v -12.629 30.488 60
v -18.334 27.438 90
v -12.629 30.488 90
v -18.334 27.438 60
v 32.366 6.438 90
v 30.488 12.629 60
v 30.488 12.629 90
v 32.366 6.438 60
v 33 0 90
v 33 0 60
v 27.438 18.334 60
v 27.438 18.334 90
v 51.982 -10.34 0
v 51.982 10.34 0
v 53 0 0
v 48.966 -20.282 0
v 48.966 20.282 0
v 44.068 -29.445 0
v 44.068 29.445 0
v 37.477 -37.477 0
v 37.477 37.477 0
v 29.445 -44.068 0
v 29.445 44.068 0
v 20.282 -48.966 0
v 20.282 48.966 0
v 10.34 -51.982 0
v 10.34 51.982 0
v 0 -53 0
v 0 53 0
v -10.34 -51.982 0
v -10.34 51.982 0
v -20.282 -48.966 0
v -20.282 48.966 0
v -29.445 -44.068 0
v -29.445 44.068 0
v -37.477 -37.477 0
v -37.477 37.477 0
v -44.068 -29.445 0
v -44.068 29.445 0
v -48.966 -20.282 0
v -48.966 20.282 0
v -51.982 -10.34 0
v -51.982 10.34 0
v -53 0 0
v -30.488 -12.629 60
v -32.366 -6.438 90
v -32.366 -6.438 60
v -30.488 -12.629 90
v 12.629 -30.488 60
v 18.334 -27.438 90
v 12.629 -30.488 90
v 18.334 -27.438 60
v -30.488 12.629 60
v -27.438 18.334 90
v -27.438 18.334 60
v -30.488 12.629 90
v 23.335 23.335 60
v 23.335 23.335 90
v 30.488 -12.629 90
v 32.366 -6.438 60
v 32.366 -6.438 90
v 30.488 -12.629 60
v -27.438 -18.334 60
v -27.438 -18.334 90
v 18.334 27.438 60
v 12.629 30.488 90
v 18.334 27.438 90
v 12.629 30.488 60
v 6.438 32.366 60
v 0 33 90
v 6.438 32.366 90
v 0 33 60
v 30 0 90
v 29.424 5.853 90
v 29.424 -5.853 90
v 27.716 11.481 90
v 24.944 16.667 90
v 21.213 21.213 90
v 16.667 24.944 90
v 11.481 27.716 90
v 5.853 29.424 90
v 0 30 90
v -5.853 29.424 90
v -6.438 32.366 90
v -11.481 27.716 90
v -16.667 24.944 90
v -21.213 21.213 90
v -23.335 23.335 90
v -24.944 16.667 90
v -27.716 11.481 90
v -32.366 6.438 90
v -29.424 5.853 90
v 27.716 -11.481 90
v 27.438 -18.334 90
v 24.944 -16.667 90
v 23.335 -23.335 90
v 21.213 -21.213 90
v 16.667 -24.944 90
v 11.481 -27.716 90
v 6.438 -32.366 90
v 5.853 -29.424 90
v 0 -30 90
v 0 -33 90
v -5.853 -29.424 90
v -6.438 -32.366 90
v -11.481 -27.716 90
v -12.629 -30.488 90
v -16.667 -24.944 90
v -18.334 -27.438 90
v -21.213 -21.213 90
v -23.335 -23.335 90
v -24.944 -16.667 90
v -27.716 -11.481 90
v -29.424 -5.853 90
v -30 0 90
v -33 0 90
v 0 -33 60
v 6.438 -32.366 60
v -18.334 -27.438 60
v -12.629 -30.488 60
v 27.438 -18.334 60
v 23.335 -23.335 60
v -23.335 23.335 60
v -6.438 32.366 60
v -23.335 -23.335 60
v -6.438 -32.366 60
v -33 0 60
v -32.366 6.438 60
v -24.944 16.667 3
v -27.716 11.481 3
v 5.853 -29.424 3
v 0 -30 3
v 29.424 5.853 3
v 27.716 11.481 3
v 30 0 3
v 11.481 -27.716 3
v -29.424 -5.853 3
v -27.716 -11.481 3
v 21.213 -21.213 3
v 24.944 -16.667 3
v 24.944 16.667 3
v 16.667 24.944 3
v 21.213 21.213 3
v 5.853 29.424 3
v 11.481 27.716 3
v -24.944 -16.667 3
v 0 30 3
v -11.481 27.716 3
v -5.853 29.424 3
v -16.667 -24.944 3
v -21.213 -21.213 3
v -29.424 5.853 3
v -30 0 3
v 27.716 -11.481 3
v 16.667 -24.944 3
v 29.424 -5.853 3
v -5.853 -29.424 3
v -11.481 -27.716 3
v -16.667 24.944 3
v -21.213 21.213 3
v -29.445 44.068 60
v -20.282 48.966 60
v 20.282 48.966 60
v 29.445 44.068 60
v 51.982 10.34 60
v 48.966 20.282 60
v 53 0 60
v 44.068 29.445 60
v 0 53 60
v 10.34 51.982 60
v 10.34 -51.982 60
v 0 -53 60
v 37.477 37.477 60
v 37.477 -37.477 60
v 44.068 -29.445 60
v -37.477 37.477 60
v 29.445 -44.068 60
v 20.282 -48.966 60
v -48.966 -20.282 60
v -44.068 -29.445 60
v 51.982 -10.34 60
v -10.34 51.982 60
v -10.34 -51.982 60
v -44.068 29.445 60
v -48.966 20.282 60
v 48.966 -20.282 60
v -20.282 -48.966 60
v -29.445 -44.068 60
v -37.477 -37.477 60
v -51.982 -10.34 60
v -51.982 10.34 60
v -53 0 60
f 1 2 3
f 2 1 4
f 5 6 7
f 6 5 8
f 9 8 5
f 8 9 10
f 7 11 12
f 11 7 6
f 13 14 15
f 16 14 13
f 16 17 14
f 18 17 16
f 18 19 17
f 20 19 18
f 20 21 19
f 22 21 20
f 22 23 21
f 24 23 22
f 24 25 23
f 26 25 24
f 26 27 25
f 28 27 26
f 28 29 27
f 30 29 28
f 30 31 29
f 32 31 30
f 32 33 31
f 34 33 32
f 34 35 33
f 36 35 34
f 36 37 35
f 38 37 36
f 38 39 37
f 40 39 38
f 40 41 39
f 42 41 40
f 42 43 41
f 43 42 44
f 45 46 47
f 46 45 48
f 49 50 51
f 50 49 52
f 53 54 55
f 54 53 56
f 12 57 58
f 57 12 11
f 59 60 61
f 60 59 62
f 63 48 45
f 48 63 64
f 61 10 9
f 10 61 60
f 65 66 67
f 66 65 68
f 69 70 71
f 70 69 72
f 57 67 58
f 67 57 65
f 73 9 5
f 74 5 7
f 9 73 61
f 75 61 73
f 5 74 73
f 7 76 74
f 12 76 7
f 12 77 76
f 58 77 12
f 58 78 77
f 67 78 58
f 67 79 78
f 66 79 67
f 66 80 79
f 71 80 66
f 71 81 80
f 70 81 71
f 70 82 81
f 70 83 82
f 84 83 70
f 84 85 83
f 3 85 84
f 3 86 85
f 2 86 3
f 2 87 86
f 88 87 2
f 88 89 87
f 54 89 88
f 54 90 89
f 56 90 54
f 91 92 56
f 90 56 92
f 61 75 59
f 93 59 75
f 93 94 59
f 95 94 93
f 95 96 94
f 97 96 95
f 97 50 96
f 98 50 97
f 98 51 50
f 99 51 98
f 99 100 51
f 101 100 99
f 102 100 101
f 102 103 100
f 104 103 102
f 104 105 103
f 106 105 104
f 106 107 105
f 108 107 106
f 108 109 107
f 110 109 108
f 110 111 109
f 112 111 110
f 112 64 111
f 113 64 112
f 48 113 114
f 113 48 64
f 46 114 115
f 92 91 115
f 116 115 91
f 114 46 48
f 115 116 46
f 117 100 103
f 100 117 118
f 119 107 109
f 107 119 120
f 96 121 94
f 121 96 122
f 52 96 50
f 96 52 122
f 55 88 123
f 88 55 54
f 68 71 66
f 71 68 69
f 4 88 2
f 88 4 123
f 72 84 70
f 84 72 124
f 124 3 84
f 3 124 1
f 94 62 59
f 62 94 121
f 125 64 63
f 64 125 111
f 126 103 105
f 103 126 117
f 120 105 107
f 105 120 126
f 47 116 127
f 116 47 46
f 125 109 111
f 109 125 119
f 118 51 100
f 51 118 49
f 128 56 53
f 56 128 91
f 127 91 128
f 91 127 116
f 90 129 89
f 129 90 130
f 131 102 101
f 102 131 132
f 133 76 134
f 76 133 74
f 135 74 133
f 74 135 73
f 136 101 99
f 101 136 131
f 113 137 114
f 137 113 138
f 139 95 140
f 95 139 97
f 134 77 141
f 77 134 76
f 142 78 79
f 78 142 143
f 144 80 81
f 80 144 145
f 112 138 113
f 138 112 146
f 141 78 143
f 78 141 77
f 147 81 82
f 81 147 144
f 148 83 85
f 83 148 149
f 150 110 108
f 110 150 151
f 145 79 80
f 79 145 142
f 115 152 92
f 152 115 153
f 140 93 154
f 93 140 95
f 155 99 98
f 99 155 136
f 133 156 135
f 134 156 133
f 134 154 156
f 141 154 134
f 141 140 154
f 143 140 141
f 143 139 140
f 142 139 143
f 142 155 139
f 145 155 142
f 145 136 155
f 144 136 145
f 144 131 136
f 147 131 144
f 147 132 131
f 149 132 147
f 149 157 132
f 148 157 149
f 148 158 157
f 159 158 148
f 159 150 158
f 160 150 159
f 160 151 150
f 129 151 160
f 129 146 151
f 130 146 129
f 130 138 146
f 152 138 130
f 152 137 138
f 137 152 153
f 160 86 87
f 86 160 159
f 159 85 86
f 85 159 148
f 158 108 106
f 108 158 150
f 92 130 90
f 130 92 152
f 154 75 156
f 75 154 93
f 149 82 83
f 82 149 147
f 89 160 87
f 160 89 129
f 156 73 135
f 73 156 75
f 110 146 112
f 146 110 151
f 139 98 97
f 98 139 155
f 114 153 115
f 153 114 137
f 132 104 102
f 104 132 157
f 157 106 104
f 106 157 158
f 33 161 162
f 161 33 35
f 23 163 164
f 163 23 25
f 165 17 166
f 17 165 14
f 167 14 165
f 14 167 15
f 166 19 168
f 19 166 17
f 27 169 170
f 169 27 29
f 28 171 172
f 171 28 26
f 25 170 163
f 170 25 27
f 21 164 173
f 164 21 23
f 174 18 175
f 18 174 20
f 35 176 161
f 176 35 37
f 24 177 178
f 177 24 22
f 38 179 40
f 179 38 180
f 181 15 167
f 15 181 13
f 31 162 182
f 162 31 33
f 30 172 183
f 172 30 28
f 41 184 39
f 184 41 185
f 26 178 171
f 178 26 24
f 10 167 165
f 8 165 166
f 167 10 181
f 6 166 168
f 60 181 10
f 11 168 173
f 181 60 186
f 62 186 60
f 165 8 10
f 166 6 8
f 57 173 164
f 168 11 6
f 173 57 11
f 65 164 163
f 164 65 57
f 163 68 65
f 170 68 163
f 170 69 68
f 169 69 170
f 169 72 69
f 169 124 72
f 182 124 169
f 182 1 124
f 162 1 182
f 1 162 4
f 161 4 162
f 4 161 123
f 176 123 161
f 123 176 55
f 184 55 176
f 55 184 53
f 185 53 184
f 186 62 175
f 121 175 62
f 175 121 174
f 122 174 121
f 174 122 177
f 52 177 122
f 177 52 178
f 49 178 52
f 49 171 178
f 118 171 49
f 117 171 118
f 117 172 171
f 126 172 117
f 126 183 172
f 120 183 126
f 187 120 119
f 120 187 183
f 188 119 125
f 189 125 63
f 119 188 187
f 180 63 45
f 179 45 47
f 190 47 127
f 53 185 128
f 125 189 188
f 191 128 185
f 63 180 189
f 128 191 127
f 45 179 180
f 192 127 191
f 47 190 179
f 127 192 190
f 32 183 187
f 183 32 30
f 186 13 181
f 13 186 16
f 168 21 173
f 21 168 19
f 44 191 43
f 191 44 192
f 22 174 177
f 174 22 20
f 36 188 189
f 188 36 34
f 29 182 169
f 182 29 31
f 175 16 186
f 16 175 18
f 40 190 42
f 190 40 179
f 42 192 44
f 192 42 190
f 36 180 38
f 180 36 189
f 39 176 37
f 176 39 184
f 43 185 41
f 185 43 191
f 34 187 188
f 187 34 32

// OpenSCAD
// Stiftköcher: Innenbecher + oben offener Außenring
// mit radialen Kompartimenten innen und außen
// Version 2.5

// --- Parameter ---
inner_diameter         = 60;   // Innendurchmesser des Hauptfachs (mm)
inner_height           = 90;   // Höhe des Innenbechers (mm)

outer_ring_width       = 20;   // Breite des äußeren Rings (mm)
outer_height           = 60;   // Höhe des äußeren Rings/Fächer (mm)

wall_thickness         = 3;    // Wandstärke (innen und außen)
bottom_thickness       = 3;    // Bodenstärke (mm)

inner_compartments     = 3;    // Anzahl der Innenfächer
inner_wall_thickness   = 2;    // Dicke der Trennwände innen (mm)
inner_hub_radius       = 0;    // Radius der zentralen Nabe innen (mm), 0 für ohne Nabe

outer_compartments     = 5;   // Anzahl der Außenfächer
outer_wall_thickness   = 2;    // Dicke der Trennwände außen (mm)

top_chamfer            = 0;    // kleine Fase oben (mm), 0 = keine

$fn = 32; // Rundungen fein

// --- Hauptmodul ---
module pen_holder() {
    inner_r      = inner_diameter/2;
    outer_r_in   = inner_r + wall_thickness;        // innerer Radius des Außenrings
    outer_r_out  = outer_r_in + outer_ring_width;   // äußerer Radius des Außenrings

    // Alles als ein zusammenhängender Körper ausgeben
    union() {
        // 1) Innenbecher: geschlossen (Boden + Wand), oben offen
        difference() {
            union() {
                cylinder(h = inner_height, r = inner_r + wall_thickness);
                if (top_chamfer > 0)
                    translate([0,0,inner_height - top_chamfer])
                        cylinder(h = top_chamfer,
                                 r1 = inner_r + wall_thickness,
                                 r2 = inner_r + wall_thickness - top_chamfer);
            }
            // Innenaushöhlung bis knapp unter den Rand -> oben offen
            translate([0,0,bottom_thickness])
                cylinder(h = inner_height - bottom_thickness, r = inner_r);
        }

        // 2) Außenring: geschlossen (Boden + Wand), oben offen
        difference() {
            cylinder(h = outer_height, r = outer_r_out);
            // Innenaushöhlung des Rings bis knapp unter den Rand -> oben offen
            translate([0,0,bottom_thickness])
                cylinder(h = outer_height - bottom_thickness, r = outer_r_in);
        }

        // 3) Radiale Trennwände innen (Kompartimente)
     //   inner_radial_dividers(inner_r, inner_height);

        // 4) Radiale Trennwände außen (Kompartimente)
   //     outer_radial_dividers(outer_r_in, outer_ring_width, outer_height);
    }
}

// --- Innen: radiale Trennwände ---
module inner_radial_dividers(r_in, h) {
    // Optionale Nabe für Stabilität
    if (inner_hub_radius > 0)
        translate([0,0,bottom_thickness])
            cylinder(h = h - bottom_thickness, r = inner_hub_radius);

    for (i = [0:inner_compartments-1]) {
        angle = 360/inner_compartments * i;
        rotate([0,0,angle])
            translate([max(inner_hub_radius, 0), -inner_wall_thickness/2, bottom_thickness])
                cube([ r_in - max(inner_hub_radius, 0), inner_wall_thickness, h - bottom_thickness ]);
    }
}

// --- Außen: radiale Trennwände im Ring ---
module outer_radial_dividers(r_in, ring_w, h) {
    for (i = [0:outer_compartments-1]) {
        angle = 360/outer_compartments * i;
        rotate([0,0,angle])
            translate([r_in, -outer_wall_thickness/2, bottom_thickness])
                cube([ ring_w, outer_wall_thickness, h - bottom_thickness ]);
    }
}

// --- Aufruf ---
pen_holder();
